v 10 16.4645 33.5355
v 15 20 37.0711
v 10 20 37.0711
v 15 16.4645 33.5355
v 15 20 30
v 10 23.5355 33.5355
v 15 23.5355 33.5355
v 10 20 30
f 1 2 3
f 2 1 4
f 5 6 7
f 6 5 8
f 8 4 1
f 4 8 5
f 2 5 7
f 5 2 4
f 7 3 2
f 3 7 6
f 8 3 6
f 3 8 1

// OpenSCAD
translate(
    [10, 20, 30]
)
rotate(
    [45, 0, 0]
)
cube(
    [5, 5, 5]
);
